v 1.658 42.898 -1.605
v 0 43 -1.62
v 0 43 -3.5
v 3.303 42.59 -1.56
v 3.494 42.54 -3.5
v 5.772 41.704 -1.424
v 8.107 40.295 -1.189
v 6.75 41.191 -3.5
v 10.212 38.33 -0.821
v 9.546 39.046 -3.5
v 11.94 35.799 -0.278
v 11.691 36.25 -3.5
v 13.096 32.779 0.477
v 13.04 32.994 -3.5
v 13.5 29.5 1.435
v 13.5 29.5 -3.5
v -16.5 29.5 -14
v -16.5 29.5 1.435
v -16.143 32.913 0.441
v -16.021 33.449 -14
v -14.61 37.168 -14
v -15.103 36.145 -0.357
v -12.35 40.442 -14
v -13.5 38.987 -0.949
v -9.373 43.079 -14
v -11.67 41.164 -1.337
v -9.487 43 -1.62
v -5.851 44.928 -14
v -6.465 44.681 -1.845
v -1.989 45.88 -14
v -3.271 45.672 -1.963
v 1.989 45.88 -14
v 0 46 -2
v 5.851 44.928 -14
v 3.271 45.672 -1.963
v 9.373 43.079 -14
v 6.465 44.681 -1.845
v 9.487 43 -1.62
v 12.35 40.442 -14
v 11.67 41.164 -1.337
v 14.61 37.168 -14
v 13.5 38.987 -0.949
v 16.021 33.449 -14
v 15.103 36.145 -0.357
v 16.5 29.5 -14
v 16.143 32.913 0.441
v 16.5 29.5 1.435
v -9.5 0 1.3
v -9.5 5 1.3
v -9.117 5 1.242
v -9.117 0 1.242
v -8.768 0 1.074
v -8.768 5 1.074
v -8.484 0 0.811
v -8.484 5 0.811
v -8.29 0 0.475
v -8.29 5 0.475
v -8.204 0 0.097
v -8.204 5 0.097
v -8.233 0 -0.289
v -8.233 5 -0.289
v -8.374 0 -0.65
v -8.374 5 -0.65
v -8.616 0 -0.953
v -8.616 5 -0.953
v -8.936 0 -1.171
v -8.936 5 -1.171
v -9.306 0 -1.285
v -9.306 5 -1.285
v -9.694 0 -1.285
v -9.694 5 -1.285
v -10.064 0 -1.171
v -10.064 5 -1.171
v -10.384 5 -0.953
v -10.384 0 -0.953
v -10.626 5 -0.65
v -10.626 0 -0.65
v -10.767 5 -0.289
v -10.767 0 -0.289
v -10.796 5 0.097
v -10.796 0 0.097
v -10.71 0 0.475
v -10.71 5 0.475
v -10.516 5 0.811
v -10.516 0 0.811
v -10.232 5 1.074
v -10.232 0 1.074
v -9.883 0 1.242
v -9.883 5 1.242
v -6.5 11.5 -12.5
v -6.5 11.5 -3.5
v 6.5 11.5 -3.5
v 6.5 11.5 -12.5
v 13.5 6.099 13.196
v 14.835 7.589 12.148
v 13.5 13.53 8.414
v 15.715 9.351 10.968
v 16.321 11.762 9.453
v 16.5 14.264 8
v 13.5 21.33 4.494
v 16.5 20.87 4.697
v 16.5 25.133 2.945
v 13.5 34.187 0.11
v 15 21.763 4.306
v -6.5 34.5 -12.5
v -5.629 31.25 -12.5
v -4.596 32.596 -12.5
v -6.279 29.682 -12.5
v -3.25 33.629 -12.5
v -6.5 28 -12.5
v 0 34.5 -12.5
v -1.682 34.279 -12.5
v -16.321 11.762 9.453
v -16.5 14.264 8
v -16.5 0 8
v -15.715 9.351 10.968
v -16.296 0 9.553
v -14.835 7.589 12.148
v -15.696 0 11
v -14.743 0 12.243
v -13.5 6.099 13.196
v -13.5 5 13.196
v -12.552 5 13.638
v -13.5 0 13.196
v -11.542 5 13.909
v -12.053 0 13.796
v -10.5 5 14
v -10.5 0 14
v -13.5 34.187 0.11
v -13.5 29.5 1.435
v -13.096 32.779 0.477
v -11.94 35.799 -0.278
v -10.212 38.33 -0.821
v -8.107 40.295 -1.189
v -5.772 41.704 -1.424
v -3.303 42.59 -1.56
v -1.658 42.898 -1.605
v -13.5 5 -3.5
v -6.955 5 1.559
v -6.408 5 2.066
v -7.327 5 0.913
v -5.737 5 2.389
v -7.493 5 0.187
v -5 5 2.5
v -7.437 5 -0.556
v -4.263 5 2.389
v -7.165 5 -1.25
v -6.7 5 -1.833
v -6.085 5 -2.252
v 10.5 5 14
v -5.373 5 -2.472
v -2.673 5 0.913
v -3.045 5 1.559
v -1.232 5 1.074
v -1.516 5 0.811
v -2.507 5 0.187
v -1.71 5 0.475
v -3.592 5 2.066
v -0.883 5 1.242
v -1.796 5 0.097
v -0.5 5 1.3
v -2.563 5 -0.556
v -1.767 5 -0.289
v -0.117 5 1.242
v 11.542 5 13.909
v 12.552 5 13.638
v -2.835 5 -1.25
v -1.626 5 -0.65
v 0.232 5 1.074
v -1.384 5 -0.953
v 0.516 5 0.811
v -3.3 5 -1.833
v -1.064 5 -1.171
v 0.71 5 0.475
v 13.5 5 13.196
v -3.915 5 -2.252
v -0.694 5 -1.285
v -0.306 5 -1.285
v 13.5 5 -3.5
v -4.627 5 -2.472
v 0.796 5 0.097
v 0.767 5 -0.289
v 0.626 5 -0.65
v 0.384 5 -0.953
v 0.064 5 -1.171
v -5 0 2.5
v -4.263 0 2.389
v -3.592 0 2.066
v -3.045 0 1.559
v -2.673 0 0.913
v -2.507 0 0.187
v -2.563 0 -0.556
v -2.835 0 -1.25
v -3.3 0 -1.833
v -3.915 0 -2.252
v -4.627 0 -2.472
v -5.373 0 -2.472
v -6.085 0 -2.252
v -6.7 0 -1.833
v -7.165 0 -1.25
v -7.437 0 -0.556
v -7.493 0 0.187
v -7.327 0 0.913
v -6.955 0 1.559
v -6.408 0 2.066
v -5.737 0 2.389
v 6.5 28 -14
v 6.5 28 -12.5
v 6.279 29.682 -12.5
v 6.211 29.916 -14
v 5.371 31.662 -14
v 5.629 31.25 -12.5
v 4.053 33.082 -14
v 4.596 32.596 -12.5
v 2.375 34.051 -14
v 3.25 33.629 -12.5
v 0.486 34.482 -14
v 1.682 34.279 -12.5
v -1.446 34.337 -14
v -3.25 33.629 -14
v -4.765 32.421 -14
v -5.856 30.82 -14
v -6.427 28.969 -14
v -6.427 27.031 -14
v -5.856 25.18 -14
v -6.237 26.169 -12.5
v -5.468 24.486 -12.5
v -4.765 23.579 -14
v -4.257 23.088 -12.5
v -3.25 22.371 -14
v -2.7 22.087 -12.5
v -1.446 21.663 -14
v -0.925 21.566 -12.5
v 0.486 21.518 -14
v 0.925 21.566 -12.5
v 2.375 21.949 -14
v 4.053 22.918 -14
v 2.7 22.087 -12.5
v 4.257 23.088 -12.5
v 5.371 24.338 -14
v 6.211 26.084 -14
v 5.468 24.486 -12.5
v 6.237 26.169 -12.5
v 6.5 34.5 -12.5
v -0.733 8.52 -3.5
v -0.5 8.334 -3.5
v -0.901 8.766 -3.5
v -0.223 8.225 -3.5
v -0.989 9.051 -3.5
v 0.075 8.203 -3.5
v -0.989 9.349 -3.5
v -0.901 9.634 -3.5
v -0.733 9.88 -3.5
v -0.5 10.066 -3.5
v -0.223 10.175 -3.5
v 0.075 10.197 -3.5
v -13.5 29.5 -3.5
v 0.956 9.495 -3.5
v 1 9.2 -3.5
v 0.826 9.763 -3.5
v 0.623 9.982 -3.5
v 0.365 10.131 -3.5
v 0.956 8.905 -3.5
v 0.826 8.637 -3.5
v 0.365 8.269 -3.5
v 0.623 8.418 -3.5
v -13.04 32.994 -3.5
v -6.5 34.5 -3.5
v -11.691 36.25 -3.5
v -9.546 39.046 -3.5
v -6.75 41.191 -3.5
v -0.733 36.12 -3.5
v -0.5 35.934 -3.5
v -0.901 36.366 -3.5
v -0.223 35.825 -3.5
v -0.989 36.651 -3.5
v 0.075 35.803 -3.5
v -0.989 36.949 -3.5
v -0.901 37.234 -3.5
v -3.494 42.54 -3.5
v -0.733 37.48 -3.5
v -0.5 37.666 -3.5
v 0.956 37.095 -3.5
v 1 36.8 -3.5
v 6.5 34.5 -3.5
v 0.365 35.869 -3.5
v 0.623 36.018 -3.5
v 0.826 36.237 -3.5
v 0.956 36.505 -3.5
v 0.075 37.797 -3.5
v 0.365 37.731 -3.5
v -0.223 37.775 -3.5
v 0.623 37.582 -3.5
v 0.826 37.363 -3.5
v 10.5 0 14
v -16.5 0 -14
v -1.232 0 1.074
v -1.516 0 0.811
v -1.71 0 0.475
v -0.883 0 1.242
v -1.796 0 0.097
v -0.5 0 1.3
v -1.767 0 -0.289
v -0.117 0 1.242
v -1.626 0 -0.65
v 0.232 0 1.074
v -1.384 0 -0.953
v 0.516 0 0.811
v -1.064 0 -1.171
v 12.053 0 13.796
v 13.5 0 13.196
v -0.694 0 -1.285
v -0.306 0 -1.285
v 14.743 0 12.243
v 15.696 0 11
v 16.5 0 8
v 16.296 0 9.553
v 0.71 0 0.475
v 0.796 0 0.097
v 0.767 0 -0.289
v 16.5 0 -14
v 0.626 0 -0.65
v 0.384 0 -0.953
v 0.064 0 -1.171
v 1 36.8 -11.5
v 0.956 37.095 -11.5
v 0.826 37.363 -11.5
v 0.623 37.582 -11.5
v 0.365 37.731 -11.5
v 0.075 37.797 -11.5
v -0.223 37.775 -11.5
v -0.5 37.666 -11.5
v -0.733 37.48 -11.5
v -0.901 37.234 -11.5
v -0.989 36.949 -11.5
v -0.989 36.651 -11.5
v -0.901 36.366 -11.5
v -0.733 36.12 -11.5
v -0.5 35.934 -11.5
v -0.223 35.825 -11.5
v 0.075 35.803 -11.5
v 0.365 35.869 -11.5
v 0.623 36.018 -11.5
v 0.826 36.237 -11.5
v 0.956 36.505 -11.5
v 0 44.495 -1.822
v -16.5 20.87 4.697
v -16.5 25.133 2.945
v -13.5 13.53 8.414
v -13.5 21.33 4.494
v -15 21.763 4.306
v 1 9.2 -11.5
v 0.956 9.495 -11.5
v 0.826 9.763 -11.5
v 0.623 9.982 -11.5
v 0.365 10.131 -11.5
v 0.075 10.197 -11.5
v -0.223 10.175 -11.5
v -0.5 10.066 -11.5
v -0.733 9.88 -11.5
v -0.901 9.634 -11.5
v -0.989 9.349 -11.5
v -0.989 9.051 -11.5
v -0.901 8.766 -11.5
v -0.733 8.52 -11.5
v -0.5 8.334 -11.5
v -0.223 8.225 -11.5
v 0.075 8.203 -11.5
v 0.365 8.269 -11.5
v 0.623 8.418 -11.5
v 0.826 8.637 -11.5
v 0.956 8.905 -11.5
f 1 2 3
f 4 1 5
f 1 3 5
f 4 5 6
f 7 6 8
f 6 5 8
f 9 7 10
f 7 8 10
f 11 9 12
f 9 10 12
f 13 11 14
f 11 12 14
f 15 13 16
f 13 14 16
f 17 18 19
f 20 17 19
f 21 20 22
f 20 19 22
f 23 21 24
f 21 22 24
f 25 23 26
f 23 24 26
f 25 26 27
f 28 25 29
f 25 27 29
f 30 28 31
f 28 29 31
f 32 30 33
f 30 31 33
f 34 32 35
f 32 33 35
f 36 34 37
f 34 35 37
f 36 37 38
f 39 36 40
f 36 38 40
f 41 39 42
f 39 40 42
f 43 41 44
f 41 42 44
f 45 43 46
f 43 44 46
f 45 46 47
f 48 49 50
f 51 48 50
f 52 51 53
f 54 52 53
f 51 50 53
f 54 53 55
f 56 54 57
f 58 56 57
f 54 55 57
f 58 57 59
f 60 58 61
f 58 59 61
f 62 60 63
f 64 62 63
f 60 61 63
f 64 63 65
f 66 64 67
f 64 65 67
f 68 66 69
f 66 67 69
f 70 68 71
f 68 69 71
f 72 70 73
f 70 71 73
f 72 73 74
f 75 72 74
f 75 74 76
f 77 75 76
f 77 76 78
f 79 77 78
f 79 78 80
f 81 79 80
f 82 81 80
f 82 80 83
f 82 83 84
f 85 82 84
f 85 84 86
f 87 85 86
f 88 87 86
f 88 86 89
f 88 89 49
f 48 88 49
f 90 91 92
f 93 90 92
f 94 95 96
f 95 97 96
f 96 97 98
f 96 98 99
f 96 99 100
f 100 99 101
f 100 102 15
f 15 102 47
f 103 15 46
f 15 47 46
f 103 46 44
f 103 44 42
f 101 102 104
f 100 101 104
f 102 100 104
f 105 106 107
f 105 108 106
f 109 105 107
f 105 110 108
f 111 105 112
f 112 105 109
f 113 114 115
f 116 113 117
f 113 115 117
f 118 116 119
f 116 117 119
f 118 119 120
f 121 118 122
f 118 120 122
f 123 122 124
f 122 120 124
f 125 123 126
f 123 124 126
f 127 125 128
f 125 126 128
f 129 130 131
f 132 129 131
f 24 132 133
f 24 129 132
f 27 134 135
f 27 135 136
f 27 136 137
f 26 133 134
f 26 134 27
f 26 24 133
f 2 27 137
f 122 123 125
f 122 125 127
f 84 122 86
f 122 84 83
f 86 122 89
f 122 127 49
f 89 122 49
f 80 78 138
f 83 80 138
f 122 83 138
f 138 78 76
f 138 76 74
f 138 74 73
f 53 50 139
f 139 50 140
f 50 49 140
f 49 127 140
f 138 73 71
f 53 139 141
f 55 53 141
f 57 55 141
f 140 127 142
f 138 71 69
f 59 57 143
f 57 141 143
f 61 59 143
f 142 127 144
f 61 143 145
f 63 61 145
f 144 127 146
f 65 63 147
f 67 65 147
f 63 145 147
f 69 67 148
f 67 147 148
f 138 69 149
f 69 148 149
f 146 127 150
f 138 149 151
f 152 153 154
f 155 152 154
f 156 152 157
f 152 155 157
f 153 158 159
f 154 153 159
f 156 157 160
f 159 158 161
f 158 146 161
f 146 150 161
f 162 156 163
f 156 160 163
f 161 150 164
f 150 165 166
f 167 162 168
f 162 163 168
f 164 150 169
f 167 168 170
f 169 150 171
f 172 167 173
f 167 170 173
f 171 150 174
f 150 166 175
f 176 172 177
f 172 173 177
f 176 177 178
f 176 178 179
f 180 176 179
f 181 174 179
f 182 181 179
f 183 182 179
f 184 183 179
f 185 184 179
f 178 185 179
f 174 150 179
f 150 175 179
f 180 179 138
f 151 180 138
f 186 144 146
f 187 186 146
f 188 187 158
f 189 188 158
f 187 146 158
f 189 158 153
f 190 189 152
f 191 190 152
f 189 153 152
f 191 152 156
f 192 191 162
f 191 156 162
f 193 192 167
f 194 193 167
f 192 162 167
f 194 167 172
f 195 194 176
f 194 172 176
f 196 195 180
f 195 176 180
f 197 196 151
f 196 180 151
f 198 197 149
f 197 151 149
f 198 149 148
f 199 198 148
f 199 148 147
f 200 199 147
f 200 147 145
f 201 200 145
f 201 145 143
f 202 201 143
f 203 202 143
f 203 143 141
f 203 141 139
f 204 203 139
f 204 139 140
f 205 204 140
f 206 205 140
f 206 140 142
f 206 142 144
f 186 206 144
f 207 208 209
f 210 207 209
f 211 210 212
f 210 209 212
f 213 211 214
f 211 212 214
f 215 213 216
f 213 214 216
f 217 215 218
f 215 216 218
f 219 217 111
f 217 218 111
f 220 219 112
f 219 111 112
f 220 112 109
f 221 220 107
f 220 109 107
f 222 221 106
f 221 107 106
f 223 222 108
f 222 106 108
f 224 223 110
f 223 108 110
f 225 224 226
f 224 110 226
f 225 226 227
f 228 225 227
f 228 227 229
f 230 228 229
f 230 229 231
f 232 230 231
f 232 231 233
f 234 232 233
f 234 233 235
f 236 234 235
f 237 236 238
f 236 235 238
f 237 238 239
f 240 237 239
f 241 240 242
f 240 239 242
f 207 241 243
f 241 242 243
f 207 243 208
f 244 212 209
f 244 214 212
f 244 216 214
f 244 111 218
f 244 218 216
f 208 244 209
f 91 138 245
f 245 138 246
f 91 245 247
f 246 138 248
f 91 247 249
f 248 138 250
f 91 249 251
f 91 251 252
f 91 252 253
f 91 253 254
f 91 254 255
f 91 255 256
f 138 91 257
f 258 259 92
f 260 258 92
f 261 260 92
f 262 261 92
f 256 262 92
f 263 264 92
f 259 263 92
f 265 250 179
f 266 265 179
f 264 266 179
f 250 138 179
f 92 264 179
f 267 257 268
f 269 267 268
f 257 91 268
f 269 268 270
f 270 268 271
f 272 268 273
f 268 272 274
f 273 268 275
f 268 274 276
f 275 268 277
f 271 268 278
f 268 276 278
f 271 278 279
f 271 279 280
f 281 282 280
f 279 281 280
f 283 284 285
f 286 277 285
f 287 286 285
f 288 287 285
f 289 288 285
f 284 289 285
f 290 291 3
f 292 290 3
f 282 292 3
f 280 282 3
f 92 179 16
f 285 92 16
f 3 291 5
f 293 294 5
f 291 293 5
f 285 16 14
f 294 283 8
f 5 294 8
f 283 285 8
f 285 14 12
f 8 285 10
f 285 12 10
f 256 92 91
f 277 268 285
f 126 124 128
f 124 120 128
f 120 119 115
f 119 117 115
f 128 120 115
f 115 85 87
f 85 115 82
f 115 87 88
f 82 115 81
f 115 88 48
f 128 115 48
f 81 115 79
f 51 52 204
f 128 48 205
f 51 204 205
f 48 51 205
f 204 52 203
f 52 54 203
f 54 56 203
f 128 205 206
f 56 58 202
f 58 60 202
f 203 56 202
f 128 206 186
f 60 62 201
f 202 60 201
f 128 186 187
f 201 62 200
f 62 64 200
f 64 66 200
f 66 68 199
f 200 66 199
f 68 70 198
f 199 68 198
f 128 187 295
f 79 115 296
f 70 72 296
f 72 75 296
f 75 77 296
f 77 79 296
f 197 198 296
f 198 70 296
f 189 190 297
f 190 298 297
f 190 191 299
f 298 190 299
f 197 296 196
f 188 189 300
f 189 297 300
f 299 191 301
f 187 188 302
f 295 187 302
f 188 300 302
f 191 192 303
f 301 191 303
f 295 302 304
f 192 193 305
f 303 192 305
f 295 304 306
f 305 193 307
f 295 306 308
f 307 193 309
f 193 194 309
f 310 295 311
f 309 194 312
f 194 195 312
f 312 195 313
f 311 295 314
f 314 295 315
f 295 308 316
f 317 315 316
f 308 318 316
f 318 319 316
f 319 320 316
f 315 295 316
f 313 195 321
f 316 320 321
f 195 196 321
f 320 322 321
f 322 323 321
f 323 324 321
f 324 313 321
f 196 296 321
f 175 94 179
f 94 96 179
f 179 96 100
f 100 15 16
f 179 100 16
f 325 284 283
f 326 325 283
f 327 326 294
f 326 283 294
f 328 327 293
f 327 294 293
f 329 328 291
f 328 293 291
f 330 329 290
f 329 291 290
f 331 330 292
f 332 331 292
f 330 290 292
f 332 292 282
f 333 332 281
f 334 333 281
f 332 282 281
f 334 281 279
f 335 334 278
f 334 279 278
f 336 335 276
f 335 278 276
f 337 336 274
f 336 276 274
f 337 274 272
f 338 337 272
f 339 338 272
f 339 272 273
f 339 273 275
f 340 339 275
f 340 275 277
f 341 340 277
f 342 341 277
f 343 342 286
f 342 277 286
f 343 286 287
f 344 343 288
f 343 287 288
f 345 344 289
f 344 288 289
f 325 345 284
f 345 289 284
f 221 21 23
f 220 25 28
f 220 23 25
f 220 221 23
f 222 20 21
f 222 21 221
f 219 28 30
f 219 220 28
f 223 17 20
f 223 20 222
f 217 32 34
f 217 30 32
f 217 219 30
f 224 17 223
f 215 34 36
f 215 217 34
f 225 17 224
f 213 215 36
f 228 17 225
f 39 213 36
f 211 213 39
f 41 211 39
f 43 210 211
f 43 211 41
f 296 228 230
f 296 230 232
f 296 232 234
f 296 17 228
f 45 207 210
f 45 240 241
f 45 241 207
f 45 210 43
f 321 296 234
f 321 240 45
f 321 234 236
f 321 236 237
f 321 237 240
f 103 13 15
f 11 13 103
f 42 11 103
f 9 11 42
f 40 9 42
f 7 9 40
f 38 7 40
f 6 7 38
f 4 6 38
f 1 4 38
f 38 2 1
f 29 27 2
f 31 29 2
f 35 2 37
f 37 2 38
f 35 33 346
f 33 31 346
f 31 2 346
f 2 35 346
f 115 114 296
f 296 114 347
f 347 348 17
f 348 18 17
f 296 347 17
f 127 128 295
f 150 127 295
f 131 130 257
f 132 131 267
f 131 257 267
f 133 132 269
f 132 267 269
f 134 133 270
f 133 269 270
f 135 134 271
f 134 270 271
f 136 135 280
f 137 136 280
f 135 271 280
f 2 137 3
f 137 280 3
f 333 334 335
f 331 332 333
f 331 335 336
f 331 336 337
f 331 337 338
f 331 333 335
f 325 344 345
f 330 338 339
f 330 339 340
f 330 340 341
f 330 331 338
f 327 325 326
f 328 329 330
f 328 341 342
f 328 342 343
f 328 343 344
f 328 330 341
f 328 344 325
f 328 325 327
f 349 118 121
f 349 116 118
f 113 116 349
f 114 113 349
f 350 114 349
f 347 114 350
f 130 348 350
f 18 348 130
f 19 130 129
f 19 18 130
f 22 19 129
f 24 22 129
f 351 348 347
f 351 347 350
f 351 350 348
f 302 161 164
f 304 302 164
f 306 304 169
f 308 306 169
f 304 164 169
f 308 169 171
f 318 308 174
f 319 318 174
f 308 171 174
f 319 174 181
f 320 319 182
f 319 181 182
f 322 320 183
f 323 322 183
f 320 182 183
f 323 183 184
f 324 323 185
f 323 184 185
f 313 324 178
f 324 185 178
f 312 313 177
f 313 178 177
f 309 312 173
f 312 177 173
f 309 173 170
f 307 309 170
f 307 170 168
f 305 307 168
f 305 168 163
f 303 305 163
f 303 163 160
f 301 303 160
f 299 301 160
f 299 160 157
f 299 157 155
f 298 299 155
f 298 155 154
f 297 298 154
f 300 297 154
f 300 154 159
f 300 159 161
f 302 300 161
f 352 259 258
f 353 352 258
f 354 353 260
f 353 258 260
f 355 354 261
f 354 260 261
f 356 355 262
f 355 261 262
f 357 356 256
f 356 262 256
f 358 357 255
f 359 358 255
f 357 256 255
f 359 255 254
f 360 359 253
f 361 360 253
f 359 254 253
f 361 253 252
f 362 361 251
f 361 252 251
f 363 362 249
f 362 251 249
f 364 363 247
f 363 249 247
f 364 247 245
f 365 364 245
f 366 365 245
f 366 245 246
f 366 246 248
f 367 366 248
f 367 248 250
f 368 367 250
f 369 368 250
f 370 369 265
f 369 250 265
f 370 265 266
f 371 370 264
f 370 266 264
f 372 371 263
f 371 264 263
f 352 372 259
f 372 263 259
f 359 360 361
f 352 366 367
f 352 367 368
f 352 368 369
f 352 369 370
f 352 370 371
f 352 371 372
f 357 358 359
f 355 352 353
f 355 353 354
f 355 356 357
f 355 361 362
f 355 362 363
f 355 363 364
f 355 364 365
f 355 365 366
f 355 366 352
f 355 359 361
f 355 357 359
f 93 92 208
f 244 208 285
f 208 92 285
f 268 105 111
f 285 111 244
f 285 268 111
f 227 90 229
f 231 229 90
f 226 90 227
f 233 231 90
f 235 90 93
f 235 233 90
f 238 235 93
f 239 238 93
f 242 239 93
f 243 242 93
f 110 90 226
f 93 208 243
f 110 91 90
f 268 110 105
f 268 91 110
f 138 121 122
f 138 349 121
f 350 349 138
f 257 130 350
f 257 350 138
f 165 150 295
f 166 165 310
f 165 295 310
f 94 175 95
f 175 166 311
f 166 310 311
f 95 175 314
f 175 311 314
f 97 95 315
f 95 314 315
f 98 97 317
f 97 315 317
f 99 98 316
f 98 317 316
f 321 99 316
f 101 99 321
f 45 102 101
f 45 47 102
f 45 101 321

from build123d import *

# Parameters (mm, degrees)
SKETCH2_W           = 33
SKETCH2_H           = 28
BOSS_EXTRUDE1_DEPTH = 46
SKETCH3_W           = 17.5
SKETCH3_H           = 41
CUT_EXTRUDE1_DEPTH  = 46
BOSS_EXTRUDE2_DEPTH = 3
BOSS_EXTRUDE3_REACH = 58.675
FILLET1_START       = -3.5
FILLET1_DEPTH       = 4.934820146
FILLET1_START_2     = -13.5
FILLET1_2_DEPTH     = 27
FILLET2_R           = 16.5
FILLET3_R           = 6
SKETCH6_W           = 13
SKETCH6_H           = 23
CUT_EXTRUDE2_DEPTH  = 9
SKETCH7_R           = 6.5
CUT_EXTRUDE3_DEPTH  = 9
SKETCH8_R           = 1
CUT_EXTRUDE4_DEPTH  = 8
SKETCH9_R           = 1.3
SKETCH9_R_2         = 2.5
CUT_EXTRUDE5_DEPTH  = 47.360004726


with BuildPart() as part:
    # Sketch2 → Boss-Extrude1 (new body)
    with BuildSketch(Plane(origin=(0, 0, 0), x_dir=(1, 0, 0), z_dir=(0, 1, 0))):
        Rectangle(SKETCH2_W, SKETCH2_H)
    extrude(amount=BOSS_EXTRUDE1_DEPTH)

    # Sketch3 → Cut-Extrude1 (cut)
    with BuildSketch(Plane(origin=(16.5, 0, 0), x_dir=(0, 0, -1), z_dir=(1, 0, 0))):
        with Locations((-5.25, 25.5)):
            Rectangle(SKETCH3_W, SKETCH3_H)
    extrude(amount=-CUT_EXTRUDE1_DEPTH, mode=Mode.SUBTRACT)

    # Sketch4 → Boss-Extrude2 (add)
    with BuildSketch(Plane(origin=(16.5, 0, 0), x_dir=(0, 0, -1), z_dir=(1, 0, 0))):
        with BuildLine():
            Line((3.5, 46), (2, 46))
            add(Edge.make_bspline(
                [(-14, 5), (-0.513369381, 23.145305793), (2, 46)],
                knots=[0, 0, 0, 1, 1, 1], degree=2))
            Line((-14, 5), (3.5, 5))
            Line((3.5, 5), (3.5, 46))
        make_face()
    boss_extrude2 = extrude(amount=-BOSS_EXTRUDE2_DEPTH)

    # Mirror1: Boss-Extrude2 across plane
    add(boss_extrude2.mirror(Plane(origin=(0, 0, 0), x_dir=(0, 0, 1), z_dir=(1, 0, 0))))

    # Boss-Extrude3: up to this face of the body (flat: up to its plane)
    boss_extrude3_end = Plane(part.part.faces().sort_by_distance((-13.5, 18.213858907, 1.639358486))[0])
    # Sketch5 → Boss-Extrude3 (add, up to the picked face)
    with BuildSketch(Plane.ZY.offset(-13.5), mode=Mode.PRIVATE) as boss_extrude3_sk1:
        with BuildLine():
            Line((-3.5, 43), (-1.619905063, 43))
            add(Edge.make_bspline(
                [(-1.619905063, 43), (-1.833911679, 44.489717492), (-2.000000005, 46.00000005)],
                knots=[0, 0, 0, 1, 1, 1], degree=2))
            Line((-2.000000005, 46.00000005), (-3.5, 46))
            Line((-3.5, 46), (-3.5, 43))
        make_face()
    boss_extrude3_tool1 = split(extrude(boss_extrude3_sk1.sketch, amount=BOSS_EXTRUDE3_REACH, mode=Mode.PRIVATE), bisect_by=boss_extrude3_end, keep=Keep.BOTH, mode=Mode.PRIVATE)
    add(boss_extrude3_tool1.solids().sort_by(Axis((13.5, 44.443503, -2.655604), (-1, 0, 0)))[0])

    # Fillet1: read off the stored shape, not the designer's step
    # Fillet1 outline → Fillet1 (add)
    with BuildSketch(Plane.XY.offset(FILLET1_START)):
        with BuildLine():
            ThreePointArc((-13.5, 29.5), (-9.545941546, 39.045941546), (0, 43))
            Line((0, 43), (-13.5, 43))
            Line((-13.5, 43), (-13.5, 29.5))
        make_face()
        with BuildLine():
            ThreePointArc((0, 43), (9.545941546, 39.045941546), (13.5, 29.5))
            Line((13.5, 29.5), (13.5, 43))
            Line((13.5, 43), (0, 43))
        make_face()
    extrude(amount=FILLET1_DEPTH)

    # Fillet1 2 outline → Fillet1 2 (cut)
    with BuildSketch(Plane.YZ.offset(FILLET1_START_2)):
        with BuildLine():
            Line((43, 1.434820146), (29.5, 1.434820046))
            add(Edge.make_bspline(
                [(29.5, 1.434820046), (36.024557501, -0.617842021), (43, -1.619905063)],
                knots=[0.500321207, 0.500321207, 0.500321207, 0.500855825, 0.500855825, 0.500855825], degree=2))
            Line((43, -1.619905063), (43, 1.434820146))
        make_face()
    extrude(amount=FILLET1_2_DEPTH, mode=Mode.SUBTRACT)

    # Fillet2
    # the kernel refuses this fillet: 16.5 mm, written as the material it takes off along each edge
    with BuildSketch(Plane(origin=(16.5, 46, -55.25), x_dir=(0, -1, 0), z_dir=(0, 0, 1)), Plane(origin=(-16.5, 46, 39.25), x_dir=(0, -1, 0), z_dir=(0, 0, -1))) as fillet2_piece_1:
        with BuildLine():
            CenterArc((FILLET2_R, -FILLET2_R), FILLET2_R, 90, 90)
            Line((0, -FILLET2_R), (0, 0))
            Line((0, 0), (FILLET2_R, 0))
        make_face()
    extrude(amount=94.5, mode=Mode.SUBTRACT)

    # Fillet3
    # the kernel refuses this fillet: 6 mm, written as the material it takes off along each edge
    with BuildSketch(Plane(origin=(-16.5, -15, 14), x_dir=(1, 0, 0), z_dir=(0, 1, 0)), Plane(origin=(16.5, -15, 14), x_dir=(0, 0, -1), z_dir=(0, 1, 0))) as fillet3_piece_1:
        with BuildLine():
            CenterArc((FILLET3_R, FILLET3_R), FILLET3_R, 180, 90)
            Line((0, FILLET3_R), (0, 0))
            Line((0, 0), (FILLET3_R, 0))
        make_face()
    extrude(amount=35, mode=Mode.SUBTRACT)

    # Sketch6 → Cut-Extrude2 (cut)
    with BuildSketch(Plane.XY.offset(-3.5)):
        with Locations((0, 23)):
            Rectangle(SKETCH6_W, SKETCH6_H)
    extrude(amount=-CUT_EXTRUDE2_DEPTH, mode=Mode.SUBTRACT)

    # Sketch7 → Cut-Extrude3 (cut)
    with BuildSketch(Plane.XY.offset(-12.5)):
        with Locations((0, 28)):
            Circle(SKETCH7_R)
    extrude(amount=-CUT_EXTRUDE3_DEPTH, mode=Mode.SUBTRACT)

    # Sketch8 → Cut-Extrude4 (cut)
    with BuildSketch(Plane.XY.offset(-3.5)):
        with Locations((0, 36.8)):
            Circle(SKETCH8_R)
        with Locations((0, 9.2)):
            Circle(SKETCH8_R)
    extrude(amount=-CUT_EXTRUDE4_DEPTH, mode=Mode.SUBTRACT)

    # Sketch9 → Cut-Extrude5 (cut, through all)
    with BuildSketch(Plane(origin=(0, 5, 0), x_dir=(1, 0, 0), z_dir=(0, 1, 0))):
        with Locations(Location((-0.5, 0, 0), (0, 0, 270))):
            Circle(SKETCH9_R)
        with Locations(Location((-5, 0, 0), (0, 0, 270))):
            Circle(SKETCH9_R_2)
        with Locations(Location((-9.5, 0, 0), (0, 0, 270))):
            Circle(SKETCH9_R)
    extrude(amount=-CUT_EXTRUDE5_DEPTH, mode=Mode.SUBTRACT)


solid = part.part
